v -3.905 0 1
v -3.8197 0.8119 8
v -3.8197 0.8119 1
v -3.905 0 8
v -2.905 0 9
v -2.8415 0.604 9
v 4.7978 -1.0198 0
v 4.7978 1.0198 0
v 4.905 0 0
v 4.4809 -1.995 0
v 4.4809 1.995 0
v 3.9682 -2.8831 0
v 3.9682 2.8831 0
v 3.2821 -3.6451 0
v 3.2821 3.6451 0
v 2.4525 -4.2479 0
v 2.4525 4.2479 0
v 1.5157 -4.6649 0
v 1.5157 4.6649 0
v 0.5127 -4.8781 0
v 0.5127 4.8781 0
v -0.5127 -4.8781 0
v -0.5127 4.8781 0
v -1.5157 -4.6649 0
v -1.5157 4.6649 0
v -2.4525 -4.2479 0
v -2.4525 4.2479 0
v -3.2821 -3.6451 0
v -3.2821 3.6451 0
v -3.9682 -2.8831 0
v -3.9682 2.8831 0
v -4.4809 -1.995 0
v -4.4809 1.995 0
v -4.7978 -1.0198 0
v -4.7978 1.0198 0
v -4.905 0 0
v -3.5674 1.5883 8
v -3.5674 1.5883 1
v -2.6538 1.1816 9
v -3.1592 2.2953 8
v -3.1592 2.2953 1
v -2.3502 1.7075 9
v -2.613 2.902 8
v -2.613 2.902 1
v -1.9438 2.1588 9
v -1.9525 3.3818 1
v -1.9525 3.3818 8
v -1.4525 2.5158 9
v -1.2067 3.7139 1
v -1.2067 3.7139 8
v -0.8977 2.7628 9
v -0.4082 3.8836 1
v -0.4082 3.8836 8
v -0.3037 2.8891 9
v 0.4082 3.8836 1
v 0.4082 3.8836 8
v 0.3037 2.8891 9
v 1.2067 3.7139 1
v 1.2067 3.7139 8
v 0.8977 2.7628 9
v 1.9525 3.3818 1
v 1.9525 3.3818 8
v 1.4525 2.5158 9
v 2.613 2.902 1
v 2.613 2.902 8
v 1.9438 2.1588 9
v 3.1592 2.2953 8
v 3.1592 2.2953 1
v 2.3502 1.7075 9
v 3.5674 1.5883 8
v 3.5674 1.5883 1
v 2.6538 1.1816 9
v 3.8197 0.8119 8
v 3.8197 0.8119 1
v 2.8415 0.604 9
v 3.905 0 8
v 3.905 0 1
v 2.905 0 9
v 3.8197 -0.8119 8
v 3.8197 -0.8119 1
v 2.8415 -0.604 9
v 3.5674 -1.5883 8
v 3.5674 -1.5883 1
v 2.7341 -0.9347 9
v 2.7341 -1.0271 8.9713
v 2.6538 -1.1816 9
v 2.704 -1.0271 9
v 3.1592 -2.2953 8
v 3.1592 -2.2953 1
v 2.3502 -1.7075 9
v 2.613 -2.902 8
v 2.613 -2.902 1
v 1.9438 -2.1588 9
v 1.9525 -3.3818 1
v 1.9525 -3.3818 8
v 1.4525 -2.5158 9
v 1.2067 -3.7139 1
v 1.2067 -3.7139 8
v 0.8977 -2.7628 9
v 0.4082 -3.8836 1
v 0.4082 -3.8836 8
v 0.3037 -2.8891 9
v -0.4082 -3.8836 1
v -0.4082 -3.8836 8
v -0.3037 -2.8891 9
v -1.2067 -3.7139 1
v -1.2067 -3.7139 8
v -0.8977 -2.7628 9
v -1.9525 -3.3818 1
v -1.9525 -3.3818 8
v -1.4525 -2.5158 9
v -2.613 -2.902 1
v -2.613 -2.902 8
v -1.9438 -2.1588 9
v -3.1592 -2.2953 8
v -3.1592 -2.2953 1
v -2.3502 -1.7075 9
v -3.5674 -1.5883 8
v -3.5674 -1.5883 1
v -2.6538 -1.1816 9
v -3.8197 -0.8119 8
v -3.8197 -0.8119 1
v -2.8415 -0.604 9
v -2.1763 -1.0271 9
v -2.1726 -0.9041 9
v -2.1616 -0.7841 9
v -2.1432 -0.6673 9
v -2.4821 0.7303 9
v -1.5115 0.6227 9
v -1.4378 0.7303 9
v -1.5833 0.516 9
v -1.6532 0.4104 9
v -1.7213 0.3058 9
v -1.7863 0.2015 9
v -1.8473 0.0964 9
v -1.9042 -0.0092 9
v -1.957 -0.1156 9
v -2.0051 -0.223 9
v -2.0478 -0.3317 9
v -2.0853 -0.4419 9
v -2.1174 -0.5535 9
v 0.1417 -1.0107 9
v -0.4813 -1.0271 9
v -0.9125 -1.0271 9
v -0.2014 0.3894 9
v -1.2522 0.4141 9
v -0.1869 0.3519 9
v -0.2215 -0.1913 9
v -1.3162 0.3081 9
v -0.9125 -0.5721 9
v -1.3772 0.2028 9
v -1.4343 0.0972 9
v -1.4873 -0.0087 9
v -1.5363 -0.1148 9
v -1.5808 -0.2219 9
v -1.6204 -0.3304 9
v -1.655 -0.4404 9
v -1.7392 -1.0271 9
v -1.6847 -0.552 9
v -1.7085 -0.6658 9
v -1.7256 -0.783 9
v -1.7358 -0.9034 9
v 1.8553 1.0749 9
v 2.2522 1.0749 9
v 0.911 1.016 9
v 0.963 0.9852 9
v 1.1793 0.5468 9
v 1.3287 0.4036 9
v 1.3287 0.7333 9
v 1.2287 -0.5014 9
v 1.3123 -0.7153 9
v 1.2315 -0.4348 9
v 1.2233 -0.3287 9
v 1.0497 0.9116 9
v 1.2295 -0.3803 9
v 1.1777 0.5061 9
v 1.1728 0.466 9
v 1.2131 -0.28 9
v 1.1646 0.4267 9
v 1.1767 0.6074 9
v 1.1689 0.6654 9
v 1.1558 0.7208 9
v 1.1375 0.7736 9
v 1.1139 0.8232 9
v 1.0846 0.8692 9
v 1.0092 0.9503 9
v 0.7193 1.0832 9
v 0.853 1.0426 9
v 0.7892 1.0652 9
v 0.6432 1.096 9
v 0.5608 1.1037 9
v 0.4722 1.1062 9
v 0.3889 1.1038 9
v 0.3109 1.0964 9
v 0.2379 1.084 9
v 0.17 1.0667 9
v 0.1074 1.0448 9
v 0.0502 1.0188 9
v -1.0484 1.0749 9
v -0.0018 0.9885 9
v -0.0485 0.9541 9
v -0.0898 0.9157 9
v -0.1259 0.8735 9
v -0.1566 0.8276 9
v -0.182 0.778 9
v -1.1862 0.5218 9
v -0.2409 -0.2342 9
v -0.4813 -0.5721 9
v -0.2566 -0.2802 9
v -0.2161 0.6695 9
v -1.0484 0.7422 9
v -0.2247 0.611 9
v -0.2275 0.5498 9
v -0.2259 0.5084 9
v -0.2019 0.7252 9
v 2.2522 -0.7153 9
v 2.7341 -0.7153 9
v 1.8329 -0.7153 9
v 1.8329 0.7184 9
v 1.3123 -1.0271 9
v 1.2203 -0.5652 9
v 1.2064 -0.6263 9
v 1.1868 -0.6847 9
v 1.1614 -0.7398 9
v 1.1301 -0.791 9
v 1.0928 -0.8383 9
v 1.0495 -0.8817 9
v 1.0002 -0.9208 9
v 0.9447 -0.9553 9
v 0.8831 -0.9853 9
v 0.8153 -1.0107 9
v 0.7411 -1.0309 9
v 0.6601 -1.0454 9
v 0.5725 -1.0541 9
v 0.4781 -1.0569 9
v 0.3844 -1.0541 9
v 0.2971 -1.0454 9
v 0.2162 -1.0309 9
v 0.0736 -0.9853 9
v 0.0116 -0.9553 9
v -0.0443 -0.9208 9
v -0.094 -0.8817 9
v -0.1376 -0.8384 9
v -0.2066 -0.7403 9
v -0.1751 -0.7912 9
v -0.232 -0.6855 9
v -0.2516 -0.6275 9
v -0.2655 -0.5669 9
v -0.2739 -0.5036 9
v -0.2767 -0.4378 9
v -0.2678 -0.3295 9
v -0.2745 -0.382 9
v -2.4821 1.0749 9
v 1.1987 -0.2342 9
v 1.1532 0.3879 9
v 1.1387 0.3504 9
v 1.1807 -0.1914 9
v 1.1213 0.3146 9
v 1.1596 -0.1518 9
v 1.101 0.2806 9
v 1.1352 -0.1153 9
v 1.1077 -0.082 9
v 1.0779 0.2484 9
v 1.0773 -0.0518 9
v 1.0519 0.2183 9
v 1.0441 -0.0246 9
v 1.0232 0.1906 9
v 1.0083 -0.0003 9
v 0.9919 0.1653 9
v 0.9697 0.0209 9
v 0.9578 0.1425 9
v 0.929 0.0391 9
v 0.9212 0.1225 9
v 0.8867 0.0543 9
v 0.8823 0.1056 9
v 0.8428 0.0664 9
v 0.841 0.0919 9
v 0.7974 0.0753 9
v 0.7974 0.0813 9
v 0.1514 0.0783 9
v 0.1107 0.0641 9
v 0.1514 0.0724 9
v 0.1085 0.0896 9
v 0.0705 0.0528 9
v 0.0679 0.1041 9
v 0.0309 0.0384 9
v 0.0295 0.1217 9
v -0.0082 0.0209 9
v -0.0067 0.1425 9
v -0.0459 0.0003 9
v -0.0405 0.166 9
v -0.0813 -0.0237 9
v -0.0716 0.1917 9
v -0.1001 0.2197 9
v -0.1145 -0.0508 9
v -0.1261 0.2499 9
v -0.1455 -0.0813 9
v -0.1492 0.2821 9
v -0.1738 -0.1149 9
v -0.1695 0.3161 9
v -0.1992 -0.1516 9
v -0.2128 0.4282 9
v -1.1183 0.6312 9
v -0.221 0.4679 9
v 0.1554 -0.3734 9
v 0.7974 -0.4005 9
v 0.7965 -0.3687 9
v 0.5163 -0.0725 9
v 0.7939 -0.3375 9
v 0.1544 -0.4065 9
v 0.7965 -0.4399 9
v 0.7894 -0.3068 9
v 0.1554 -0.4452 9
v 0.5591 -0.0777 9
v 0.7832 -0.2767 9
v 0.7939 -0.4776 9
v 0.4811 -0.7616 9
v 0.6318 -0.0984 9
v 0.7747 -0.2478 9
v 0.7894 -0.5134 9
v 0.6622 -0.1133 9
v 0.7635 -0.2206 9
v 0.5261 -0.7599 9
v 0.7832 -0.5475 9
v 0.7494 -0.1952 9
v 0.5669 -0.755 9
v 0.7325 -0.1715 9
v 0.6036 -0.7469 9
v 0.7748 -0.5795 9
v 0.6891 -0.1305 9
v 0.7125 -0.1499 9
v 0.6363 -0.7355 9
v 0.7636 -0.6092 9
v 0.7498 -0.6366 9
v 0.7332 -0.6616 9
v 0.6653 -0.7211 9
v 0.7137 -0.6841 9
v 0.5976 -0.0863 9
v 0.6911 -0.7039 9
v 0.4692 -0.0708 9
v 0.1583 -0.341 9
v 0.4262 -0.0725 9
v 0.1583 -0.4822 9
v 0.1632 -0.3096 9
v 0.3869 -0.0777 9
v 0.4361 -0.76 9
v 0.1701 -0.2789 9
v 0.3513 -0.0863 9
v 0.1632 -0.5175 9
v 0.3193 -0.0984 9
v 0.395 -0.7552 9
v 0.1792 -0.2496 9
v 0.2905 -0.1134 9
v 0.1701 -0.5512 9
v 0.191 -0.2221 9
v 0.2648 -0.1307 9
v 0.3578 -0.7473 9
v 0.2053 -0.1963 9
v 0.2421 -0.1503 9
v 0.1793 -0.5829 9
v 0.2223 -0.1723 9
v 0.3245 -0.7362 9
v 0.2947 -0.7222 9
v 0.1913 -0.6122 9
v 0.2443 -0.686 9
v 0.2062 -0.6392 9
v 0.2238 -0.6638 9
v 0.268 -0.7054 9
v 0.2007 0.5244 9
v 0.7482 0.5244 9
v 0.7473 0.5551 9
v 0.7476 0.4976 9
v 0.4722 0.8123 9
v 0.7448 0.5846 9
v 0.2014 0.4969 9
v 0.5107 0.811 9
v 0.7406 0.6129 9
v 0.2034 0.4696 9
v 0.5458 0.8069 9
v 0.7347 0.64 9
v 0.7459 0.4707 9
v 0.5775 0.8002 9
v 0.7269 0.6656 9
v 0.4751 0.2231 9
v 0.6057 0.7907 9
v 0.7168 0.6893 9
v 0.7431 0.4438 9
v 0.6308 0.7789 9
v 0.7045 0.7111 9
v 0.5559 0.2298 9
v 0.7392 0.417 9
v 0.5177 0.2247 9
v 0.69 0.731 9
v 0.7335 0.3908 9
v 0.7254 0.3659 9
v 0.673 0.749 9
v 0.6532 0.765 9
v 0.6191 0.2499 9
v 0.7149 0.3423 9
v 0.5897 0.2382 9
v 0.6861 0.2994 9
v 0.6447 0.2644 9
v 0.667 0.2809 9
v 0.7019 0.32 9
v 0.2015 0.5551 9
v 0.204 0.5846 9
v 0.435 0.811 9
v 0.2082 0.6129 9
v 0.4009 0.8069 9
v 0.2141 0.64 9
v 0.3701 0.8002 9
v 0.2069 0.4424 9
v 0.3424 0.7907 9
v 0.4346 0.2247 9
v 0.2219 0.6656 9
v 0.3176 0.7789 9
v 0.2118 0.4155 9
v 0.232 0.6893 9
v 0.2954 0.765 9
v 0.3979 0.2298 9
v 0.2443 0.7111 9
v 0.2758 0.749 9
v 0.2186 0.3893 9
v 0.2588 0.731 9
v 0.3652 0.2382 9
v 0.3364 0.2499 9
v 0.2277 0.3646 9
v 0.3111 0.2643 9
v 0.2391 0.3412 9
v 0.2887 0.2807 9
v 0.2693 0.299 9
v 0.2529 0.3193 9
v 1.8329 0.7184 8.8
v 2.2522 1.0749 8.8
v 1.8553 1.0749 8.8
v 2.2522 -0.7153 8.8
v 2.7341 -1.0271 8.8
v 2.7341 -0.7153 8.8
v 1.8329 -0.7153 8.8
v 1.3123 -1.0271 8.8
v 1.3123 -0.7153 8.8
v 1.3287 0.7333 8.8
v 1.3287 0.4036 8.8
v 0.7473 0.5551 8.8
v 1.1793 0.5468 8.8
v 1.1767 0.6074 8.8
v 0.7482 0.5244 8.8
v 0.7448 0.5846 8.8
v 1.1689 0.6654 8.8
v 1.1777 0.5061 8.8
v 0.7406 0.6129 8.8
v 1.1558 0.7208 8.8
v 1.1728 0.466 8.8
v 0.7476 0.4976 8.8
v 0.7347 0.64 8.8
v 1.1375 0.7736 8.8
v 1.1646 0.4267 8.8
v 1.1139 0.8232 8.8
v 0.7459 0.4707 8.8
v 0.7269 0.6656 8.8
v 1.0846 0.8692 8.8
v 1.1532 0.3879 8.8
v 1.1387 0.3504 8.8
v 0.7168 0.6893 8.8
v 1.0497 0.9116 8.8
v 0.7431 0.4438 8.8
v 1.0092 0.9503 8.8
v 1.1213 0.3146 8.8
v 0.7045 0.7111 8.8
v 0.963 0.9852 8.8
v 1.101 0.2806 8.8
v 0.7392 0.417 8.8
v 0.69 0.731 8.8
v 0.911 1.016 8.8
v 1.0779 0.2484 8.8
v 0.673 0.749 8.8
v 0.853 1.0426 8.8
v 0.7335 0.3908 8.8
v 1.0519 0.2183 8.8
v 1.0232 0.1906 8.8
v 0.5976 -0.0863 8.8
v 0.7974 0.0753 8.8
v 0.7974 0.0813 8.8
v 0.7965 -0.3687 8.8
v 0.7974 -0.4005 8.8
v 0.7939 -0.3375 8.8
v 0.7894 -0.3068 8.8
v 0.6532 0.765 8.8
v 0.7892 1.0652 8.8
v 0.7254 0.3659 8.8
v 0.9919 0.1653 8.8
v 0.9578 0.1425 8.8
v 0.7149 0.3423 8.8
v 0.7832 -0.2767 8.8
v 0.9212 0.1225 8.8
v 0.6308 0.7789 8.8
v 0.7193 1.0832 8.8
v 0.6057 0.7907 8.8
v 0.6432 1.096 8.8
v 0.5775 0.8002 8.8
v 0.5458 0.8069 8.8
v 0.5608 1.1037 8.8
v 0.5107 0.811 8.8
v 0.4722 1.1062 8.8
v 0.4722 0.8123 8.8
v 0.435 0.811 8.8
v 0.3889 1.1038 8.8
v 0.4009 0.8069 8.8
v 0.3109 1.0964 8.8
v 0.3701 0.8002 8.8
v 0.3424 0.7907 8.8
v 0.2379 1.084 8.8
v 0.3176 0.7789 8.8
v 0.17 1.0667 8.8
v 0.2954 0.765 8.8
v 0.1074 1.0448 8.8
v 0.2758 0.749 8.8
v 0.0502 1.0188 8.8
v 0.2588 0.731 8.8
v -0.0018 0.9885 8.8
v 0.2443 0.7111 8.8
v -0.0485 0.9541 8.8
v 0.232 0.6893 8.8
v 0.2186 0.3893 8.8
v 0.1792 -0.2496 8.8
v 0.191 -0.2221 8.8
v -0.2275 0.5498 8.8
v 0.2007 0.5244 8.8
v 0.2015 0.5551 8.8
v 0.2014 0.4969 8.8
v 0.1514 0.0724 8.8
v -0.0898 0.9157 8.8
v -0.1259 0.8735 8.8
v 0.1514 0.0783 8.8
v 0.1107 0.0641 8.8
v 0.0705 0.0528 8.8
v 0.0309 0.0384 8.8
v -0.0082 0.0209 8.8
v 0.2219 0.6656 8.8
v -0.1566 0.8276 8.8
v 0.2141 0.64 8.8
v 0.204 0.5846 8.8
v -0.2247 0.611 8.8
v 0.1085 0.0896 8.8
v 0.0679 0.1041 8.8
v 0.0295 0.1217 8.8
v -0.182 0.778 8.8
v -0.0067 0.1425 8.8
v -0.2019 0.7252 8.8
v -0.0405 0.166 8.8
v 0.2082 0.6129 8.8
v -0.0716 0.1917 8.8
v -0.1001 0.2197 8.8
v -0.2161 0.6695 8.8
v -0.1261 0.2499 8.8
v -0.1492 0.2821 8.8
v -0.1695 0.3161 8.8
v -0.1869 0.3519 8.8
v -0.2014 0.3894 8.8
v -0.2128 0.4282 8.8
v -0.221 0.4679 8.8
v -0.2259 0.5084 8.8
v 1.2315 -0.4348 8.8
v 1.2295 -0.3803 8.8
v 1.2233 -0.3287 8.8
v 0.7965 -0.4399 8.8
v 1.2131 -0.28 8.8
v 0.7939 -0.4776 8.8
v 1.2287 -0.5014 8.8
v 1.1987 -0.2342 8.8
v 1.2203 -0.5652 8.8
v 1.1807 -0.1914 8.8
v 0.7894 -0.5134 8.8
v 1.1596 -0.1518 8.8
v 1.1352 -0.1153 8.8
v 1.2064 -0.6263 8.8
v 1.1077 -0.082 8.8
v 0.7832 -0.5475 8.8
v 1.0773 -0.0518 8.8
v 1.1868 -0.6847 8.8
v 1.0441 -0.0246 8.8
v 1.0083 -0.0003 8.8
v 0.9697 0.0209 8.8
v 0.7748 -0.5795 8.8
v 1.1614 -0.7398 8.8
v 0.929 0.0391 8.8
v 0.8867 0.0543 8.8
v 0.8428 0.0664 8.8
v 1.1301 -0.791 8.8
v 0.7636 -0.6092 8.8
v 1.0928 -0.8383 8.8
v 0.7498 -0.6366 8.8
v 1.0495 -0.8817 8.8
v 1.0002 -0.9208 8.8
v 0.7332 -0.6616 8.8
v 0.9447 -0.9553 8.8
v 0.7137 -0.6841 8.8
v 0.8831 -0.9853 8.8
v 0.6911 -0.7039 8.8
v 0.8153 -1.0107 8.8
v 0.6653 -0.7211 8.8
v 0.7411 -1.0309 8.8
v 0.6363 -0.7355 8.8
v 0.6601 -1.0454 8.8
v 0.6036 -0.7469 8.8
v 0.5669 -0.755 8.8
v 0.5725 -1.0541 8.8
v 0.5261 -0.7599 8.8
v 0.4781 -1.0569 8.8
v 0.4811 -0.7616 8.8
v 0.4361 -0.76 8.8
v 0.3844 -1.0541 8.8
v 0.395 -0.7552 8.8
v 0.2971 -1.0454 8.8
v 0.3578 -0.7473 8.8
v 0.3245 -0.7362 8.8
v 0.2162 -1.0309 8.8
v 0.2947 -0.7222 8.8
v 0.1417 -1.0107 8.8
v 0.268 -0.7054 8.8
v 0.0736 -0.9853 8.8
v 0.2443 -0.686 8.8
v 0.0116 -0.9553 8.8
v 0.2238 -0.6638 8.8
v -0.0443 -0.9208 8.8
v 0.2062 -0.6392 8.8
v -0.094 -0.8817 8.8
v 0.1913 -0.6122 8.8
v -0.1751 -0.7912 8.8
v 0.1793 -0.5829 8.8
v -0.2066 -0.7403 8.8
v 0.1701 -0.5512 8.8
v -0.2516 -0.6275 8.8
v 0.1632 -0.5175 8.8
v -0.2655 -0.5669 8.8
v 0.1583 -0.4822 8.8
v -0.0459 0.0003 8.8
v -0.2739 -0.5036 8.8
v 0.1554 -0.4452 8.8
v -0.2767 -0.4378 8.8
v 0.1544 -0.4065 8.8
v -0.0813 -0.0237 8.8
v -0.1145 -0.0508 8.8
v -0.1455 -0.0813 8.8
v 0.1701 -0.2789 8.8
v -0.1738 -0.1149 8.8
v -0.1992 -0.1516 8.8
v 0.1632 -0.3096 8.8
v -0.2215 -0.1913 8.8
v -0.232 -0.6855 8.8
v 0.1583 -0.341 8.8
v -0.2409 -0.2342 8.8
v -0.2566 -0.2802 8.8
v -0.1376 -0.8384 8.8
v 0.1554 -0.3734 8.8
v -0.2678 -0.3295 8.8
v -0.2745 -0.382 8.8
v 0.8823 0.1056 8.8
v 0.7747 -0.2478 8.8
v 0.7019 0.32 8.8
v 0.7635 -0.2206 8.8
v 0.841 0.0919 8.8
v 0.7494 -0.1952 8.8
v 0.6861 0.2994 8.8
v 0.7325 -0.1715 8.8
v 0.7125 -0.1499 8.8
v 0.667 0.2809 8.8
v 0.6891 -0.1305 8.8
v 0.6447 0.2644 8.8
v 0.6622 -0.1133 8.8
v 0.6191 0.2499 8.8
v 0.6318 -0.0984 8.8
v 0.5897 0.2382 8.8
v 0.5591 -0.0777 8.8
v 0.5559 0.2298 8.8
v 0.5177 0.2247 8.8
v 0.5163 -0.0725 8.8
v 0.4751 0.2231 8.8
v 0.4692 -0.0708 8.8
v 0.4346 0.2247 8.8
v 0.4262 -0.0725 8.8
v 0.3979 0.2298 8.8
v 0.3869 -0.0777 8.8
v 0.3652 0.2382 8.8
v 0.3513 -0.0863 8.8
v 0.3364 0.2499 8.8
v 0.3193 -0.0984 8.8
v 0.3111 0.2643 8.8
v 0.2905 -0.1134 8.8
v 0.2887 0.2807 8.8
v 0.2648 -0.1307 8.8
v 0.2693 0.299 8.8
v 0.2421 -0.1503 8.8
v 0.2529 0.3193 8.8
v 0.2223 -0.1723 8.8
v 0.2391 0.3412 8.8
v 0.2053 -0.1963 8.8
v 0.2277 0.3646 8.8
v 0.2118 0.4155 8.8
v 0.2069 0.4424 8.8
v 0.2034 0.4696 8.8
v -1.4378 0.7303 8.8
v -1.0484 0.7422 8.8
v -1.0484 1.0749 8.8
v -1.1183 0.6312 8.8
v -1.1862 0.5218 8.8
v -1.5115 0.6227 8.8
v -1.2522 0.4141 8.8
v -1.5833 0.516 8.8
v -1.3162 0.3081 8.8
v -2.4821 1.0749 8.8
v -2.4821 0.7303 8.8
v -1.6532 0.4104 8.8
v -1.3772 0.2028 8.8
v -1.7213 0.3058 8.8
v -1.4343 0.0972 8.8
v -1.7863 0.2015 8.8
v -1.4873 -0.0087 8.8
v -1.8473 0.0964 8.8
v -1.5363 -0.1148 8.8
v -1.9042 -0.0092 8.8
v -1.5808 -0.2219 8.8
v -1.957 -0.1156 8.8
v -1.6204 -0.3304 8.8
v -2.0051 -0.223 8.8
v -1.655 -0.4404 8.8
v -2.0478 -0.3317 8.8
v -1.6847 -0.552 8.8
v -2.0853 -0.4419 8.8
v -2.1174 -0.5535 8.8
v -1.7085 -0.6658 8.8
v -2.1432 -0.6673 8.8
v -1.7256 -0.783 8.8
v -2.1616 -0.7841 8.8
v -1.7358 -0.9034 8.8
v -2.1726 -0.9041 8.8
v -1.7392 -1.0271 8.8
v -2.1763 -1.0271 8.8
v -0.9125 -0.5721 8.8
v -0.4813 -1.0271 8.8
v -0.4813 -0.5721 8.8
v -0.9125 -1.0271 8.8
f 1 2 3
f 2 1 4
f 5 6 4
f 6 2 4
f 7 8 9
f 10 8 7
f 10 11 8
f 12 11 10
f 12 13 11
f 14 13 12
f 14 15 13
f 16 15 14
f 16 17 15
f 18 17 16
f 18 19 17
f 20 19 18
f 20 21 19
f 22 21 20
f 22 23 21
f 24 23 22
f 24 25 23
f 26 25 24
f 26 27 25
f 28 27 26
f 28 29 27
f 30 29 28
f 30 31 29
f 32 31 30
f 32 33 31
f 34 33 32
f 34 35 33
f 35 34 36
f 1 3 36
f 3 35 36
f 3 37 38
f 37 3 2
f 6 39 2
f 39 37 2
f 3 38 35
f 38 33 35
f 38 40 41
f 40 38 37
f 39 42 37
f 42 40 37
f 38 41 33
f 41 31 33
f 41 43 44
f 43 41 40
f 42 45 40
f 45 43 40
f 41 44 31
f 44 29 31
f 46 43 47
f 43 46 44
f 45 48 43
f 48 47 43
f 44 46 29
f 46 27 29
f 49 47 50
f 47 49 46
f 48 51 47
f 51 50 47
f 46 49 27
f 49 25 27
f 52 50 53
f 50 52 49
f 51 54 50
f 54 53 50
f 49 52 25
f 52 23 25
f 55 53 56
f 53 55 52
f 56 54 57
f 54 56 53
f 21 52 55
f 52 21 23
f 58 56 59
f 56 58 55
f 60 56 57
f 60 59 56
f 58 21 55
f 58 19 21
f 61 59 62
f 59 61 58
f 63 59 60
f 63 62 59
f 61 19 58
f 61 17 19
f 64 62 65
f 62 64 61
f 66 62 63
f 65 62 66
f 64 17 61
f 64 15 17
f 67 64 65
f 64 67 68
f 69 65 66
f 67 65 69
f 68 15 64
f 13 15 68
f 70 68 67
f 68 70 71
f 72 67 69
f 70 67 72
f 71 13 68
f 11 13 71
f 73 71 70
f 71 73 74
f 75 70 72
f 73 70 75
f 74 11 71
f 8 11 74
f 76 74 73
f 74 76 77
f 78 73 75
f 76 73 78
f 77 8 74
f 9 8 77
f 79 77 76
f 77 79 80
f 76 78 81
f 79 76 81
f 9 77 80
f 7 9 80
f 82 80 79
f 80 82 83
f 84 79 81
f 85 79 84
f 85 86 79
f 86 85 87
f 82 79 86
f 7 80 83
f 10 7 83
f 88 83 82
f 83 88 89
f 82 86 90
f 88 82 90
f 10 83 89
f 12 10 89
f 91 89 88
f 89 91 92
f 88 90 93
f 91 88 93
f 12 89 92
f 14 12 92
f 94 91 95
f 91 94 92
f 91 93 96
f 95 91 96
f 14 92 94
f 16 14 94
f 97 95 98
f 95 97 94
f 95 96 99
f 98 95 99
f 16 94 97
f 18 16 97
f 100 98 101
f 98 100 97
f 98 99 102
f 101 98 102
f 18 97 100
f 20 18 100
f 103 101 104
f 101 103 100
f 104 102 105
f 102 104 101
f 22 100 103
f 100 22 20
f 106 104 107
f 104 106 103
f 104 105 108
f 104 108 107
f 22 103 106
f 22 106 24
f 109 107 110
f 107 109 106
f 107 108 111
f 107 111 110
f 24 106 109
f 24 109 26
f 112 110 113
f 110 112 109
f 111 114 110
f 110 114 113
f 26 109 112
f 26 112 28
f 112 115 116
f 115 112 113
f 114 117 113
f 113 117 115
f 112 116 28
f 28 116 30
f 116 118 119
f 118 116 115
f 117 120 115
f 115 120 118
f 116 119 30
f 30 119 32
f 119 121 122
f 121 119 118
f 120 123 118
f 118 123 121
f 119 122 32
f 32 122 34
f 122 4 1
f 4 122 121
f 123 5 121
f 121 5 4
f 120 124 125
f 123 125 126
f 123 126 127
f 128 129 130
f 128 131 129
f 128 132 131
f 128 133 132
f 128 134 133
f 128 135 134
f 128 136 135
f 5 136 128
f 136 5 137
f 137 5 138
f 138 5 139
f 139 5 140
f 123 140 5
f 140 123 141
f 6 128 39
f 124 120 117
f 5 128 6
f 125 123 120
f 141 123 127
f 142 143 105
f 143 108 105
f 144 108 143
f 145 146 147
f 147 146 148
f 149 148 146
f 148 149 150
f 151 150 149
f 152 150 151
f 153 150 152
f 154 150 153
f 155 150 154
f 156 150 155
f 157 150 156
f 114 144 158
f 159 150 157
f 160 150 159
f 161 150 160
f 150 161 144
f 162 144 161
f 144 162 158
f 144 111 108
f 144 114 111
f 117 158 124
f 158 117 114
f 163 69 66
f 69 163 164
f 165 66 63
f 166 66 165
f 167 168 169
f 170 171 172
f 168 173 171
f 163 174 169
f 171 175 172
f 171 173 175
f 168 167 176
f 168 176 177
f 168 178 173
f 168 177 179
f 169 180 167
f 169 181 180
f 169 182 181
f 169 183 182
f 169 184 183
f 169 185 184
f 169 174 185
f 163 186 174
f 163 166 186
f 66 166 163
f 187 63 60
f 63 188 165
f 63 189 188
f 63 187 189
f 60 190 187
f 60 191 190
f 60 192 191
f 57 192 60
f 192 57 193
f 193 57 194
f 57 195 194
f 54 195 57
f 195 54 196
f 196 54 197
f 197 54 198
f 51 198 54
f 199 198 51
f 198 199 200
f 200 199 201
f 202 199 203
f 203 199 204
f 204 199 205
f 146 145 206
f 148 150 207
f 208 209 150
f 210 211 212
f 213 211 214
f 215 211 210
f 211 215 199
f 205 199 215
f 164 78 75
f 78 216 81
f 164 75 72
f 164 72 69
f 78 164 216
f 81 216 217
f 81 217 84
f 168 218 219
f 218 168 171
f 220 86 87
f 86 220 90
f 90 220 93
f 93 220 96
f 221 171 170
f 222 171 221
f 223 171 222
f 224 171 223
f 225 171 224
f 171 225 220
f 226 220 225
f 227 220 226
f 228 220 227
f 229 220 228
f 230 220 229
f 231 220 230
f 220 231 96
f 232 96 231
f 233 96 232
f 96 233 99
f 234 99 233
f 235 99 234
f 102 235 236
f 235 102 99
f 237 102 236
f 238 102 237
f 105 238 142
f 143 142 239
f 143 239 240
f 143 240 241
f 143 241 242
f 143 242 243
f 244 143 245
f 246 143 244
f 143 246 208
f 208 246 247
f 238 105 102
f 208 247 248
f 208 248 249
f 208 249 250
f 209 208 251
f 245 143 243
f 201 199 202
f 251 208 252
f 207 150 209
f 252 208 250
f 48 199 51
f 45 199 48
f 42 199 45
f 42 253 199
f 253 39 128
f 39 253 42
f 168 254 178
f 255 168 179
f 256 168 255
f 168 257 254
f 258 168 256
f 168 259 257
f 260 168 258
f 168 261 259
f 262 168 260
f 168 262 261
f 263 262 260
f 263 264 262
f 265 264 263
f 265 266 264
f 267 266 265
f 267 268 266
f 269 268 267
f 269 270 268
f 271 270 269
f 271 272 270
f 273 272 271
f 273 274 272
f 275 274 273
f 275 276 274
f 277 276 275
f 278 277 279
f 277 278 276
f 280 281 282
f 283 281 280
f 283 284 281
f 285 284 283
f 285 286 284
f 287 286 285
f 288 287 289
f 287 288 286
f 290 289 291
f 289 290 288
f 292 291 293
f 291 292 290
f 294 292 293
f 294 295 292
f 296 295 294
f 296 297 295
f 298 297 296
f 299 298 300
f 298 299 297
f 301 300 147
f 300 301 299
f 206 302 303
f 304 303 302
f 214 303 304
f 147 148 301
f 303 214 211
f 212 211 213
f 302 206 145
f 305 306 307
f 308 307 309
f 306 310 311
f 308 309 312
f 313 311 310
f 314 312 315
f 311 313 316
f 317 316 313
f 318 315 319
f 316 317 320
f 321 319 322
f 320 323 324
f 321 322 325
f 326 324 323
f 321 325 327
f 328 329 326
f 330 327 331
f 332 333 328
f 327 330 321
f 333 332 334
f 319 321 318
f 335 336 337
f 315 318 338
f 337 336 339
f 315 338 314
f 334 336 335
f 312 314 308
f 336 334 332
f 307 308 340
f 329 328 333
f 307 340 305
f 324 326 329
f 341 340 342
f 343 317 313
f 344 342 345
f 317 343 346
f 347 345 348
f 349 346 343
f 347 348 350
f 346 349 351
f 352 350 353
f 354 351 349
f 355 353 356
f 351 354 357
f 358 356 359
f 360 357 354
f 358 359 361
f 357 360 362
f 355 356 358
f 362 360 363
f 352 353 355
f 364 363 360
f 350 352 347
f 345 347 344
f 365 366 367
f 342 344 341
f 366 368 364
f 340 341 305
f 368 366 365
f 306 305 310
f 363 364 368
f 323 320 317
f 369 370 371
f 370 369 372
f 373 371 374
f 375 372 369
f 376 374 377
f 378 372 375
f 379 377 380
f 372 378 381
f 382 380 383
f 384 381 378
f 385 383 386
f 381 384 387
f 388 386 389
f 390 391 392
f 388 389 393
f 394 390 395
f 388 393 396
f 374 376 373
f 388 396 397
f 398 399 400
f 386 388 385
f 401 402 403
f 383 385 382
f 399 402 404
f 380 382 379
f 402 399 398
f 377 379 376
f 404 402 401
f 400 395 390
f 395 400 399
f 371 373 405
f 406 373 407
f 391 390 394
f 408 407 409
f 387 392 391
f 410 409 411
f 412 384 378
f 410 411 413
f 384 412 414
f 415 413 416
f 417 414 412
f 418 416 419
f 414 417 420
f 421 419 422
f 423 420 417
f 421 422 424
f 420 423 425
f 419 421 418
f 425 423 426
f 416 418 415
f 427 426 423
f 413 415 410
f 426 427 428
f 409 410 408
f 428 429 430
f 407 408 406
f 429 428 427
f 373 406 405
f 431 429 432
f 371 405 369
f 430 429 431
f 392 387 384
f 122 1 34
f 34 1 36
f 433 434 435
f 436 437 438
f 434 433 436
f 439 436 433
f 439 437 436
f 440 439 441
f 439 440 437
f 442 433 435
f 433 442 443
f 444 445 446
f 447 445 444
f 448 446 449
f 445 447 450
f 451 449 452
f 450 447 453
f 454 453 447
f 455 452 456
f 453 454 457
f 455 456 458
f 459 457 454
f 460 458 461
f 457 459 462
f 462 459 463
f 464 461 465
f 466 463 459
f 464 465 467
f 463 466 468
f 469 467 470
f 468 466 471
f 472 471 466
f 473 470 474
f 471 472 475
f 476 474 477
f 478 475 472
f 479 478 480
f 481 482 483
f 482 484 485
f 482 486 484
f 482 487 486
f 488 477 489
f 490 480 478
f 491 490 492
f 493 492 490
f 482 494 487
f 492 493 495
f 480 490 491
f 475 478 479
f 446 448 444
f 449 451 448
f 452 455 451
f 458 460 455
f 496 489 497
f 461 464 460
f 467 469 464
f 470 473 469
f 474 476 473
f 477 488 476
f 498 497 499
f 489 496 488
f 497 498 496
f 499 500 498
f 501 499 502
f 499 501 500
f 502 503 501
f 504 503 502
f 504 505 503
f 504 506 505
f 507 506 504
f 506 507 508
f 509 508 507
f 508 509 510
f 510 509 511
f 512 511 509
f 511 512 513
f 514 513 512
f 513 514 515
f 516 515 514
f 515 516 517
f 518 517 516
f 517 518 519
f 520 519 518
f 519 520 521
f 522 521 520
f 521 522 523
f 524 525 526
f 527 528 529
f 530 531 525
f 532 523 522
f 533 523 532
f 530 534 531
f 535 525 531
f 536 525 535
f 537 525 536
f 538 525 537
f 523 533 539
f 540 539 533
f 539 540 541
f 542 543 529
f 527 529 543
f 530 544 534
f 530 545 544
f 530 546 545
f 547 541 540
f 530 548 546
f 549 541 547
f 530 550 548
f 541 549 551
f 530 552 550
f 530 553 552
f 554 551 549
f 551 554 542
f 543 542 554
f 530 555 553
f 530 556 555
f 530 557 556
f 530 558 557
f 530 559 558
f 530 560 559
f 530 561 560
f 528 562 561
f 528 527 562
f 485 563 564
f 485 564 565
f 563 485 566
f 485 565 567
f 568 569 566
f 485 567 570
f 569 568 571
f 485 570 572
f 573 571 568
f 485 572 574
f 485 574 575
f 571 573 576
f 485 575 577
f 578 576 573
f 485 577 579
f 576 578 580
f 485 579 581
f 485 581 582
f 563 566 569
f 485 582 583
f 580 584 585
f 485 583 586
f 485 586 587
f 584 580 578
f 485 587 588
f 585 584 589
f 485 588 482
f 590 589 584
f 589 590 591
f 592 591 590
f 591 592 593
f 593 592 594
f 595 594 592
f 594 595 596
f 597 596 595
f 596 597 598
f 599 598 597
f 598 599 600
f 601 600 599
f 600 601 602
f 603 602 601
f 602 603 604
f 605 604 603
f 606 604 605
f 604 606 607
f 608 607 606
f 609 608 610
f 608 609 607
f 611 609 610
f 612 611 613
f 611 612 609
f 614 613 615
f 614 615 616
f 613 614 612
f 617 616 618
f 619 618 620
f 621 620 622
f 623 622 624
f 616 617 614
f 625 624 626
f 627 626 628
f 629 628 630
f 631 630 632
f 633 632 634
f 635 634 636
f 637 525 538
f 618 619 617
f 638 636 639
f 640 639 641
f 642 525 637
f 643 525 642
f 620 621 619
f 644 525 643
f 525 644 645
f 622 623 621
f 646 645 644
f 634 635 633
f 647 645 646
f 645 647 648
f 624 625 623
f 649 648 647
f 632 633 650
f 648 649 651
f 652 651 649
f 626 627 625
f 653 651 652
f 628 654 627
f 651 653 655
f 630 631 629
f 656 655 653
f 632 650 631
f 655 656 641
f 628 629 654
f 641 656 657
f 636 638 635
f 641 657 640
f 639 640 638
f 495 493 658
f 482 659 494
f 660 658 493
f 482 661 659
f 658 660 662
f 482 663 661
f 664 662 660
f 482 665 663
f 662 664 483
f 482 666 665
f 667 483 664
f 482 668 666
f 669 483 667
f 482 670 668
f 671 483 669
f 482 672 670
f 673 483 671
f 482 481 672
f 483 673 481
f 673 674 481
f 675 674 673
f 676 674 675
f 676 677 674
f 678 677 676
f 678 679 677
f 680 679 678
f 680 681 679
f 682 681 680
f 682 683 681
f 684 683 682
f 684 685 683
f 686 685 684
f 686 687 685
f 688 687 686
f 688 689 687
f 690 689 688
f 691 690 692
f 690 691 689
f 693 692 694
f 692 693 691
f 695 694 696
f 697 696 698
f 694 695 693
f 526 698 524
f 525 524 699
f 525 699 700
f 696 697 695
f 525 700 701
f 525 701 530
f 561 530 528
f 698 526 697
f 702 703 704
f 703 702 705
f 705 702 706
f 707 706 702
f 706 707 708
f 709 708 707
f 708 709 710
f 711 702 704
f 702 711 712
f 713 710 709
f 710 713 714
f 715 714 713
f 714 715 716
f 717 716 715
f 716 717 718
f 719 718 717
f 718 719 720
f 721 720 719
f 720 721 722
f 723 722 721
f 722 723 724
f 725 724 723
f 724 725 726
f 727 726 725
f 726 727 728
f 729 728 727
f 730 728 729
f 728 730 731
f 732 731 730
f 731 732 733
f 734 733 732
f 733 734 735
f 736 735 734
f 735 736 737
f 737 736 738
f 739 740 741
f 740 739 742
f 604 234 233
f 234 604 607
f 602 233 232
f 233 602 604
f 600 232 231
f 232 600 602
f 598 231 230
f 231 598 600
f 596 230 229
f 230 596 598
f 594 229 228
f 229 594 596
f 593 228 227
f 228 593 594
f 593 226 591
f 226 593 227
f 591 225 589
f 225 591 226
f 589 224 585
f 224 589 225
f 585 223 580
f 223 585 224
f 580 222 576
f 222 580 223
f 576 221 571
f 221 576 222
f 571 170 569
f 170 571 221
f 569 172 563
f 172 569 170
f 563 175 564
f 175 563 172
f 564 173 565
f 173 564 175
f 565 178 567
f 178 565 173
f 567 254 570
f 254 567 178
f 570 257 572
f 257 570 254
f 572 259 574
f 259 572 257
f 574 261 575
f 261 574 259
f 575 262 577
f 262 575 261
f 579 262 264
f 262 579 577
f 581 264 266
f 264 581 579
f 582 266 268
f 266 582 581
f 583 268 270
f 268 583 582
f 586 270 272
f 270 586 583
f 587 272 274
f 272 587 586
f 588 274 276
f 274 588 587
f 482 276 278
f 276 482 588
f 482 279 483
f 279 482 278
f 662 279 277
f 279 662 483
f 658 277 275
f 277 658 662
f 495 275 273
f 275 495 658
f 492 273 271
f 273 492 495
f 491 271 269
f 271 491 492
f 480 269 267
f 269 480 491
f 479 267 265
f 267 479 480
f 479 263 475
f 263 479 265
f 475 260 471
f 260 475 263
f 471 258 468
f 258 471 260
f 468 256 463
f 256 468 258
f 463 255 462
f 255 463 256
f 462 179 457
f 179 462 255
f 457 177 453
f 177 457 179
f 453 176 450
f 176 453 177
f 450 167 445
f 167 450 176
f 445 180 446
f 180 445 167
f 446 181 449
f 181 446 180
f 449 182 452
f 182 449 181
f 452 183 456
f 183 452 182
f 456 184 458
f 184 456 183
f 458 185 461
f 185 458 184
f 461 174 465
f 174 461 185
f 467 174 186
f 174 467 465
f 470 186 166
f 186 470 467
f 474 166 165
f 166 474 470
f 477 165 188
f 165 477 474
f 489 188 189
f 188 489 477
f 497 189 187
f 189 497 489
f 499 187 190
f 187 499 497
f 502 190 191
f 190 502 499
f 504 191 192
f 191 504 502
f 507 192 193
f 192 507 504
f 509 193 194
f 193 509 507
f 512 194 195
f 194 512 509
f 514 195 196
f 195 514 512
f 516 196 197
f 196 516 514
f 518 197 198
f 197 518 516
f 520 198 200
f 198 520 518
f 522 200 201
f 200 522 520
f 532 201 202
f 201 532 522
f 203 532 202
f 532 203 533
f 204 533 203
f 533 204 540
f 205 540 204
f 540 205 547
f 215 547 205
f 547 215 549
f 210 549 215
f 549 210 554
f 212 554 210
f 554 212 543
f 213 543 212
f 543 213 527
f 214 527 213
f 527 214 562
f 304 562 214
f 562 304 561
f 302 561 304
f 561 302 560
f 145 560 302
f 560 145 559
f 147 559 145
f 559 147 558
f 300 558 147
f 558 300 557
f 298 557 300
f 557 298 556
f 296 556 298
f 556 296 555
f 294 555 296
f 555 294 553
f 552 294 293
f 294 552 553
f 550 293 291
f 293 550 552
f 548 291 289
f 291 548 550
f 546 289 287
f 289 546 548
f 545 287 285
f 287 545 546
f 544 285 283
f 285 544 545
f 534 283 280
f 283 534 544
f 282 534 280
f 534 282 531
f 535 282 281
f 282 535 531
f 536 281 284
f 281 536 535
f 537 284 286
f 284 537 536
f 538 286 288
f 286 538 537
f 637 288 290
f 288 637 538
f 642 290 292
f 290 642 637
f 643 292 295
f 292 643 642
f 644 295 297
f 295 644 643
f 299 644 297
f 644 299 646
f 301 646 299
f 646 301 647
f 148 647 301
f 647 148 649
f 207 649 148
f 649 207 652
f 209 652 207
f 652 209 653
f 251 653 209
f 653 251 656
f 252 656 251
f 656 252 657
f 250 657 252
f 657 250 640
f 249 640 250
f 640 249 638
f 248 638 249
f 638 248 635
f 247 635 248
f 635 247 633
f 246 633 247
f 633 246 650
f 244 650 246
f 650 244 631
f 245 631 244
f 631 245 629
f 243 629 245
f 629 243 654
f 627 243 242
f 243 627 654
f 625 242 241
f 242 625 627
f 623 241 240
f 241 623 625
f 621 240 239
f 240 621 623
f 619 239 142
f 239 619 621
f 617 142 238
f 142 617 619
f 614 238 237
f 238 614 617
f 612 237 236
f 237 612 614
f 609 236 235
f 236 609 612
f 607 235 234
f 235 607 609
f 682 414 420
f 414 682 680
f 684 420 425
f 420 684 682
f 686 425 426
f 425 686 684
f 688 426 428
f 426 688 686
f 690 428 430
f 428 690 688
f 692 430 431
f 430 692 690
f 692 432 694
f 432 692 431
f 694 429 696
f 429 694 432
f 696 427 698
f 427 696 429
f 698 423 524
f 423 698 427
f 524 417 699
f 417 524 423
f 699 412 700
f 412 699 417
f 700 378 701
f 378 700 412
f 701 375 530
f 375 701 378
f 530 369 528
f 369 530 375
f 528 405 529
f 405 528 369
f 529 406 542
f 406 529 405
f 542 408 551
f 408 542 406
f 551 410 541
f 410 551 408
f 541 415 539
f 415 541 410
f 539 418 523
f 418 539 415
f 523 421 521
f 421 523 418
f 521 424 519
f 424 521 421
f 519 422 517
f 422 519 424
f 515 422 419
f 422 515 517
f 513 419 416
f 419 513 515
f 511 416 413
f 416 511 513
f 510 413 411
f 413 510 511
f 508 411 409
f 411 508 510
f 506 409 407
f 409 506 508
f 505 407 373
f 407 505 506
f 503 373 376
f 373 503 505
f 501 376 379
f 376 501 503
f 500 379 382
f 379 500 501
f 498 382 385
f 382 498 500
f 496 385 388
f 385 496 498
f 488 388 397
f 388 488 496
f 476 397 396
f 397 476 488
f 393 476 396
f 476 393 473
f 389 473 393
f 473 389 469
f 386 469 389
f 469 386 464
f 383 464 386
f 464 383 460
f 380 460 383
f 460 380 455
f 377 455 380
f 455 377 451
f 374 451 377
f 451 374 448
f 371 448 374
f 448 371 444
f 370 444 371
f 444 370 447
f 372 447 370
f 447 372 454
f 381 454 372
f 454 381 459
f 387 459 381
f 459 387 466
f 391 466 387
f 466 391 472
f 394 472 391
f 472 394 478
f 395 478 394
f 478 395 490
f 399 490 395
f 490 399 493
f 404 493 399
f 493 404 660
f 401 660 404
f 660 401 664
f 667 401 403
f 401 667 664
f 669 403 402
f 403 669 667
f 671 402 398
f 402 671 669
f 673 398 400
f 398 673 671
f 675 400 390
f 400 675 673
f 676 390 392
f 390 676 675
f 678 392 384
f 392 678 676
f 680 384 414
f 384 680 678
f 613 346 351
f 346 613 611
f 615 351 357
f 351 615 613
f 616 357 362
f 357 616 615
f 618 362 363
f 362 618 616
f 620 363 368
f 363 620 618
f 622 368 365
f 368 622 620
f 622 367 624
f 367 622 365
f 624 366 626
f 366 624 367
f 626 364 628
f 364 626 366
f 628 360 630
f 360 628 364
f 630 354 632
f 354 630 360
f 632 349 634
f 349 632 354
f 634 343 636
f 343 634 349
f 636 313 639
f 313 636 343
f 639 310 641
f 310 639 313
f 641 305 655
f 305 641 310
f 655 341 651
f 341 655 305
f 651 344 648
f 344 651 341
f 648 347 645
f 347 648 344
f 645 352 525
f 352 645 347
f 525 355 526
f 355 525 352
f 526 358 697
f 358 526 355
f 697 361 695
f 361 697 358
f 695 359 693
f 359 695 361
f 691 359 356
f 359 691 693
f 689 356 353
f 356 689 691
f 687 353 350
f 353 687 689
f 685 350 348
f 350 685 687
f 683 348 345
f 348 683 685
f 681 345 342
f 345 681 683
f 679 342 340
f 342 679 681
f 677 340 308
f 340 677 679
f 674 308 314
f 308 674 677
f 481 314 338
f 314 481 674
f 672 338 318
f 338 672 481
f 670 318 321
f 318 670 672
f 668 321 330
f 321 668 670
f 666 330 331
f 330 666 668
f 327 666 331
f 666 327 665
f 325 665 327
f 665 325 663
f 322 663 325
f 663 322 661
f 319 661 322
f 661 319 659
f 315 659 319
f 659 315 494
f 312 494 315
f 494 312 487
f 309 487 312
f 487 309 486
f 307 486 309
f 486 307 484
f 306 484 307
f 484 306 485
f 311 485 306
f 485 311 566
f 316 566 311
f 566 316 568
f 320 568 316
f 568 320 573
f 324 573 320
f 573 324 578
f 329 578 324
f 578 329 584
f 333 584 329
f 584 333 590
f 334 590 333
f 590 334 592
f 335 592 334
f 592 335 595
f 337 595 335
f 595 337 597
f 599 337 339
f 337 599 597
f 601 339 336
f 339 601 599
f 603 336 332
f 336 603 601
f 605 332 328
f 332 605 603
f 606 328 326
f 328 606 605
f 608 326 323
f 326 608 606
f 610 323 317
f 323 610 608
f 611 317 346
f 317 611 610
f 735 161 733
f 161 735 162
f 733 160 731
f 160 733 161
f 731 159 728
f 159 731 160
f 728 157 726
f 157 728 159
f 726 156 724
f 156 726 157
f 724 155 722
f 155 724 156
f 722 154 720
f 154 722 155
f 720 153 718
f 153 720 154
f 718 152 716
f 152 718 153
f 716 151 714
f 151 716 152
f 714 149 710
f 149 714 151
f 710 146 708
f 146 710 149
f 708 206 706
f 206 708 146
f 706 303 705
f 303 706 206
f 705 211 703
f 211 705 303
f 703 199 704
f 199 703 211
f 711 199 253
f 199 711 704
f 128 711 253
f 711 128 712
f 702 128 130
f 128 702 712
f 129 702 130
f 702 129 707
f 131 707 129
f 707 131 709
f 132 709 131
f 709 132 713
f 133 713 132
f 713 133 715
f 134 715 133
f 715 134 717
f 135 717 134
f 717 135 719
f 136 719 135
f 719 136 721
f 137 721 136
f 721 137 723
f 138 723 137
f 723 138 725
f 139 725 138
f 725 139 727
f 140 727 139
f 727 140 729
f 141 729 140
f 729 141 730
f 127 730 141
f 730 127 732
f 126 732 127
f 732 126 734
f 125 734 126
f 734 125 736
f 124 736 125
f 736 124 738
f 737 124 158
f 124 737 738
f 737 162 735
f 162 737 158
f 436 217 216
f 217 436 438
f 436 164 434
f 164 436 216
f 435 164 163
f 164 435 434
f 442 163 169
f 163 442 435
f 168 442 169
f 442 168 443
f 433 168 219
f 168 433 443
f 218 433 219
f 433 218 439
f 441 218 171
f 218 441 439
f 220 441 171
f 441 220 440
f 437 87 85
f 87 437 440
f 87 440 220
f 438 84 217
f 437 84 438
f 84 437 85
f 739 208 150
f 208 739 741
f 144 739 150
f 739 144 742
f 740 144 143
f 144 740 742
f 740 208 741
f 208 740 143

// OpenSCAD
// SPDX-License-Identifier: CC-BY-SA-4.0
// SPDX-FileCopyrightText: Copyright 2024 Sam Blenny

module press_fit_post(diameter, height, chamfer=1, label=false, $fn=30) {
    r = diameter / 2;
    h = height;
    c = chamfer;
    difference() {
        // Rotate this 2D polygon around the Z axis to make a post
        // with inward chamfer at top and outward chamfer around base
        // ---,
        //    |
        //    |
        // ____\
        rotate_extrude(convexity=10)
            polygon([
                [0,0], [r+c, 0], [r, c],
                [r, h-c], [r-c, h], [0, h],
            ]);
        // Optionally inset text with diameter label on the top face
        if (label) {
            translate([0,0,h-0.2])
                linear_extrude(0.3)
                    text(
                        text=str(diameter),
                        size=2.2,
                        font="Liberation Sans:style=Bold",
                        halign="center",
                        valign="center",
                        spacing=0.9
                    );
        }
    }
}

// Example post
press_fit_post(diameter=7.81, height=9, chamfer=1, label=true);
